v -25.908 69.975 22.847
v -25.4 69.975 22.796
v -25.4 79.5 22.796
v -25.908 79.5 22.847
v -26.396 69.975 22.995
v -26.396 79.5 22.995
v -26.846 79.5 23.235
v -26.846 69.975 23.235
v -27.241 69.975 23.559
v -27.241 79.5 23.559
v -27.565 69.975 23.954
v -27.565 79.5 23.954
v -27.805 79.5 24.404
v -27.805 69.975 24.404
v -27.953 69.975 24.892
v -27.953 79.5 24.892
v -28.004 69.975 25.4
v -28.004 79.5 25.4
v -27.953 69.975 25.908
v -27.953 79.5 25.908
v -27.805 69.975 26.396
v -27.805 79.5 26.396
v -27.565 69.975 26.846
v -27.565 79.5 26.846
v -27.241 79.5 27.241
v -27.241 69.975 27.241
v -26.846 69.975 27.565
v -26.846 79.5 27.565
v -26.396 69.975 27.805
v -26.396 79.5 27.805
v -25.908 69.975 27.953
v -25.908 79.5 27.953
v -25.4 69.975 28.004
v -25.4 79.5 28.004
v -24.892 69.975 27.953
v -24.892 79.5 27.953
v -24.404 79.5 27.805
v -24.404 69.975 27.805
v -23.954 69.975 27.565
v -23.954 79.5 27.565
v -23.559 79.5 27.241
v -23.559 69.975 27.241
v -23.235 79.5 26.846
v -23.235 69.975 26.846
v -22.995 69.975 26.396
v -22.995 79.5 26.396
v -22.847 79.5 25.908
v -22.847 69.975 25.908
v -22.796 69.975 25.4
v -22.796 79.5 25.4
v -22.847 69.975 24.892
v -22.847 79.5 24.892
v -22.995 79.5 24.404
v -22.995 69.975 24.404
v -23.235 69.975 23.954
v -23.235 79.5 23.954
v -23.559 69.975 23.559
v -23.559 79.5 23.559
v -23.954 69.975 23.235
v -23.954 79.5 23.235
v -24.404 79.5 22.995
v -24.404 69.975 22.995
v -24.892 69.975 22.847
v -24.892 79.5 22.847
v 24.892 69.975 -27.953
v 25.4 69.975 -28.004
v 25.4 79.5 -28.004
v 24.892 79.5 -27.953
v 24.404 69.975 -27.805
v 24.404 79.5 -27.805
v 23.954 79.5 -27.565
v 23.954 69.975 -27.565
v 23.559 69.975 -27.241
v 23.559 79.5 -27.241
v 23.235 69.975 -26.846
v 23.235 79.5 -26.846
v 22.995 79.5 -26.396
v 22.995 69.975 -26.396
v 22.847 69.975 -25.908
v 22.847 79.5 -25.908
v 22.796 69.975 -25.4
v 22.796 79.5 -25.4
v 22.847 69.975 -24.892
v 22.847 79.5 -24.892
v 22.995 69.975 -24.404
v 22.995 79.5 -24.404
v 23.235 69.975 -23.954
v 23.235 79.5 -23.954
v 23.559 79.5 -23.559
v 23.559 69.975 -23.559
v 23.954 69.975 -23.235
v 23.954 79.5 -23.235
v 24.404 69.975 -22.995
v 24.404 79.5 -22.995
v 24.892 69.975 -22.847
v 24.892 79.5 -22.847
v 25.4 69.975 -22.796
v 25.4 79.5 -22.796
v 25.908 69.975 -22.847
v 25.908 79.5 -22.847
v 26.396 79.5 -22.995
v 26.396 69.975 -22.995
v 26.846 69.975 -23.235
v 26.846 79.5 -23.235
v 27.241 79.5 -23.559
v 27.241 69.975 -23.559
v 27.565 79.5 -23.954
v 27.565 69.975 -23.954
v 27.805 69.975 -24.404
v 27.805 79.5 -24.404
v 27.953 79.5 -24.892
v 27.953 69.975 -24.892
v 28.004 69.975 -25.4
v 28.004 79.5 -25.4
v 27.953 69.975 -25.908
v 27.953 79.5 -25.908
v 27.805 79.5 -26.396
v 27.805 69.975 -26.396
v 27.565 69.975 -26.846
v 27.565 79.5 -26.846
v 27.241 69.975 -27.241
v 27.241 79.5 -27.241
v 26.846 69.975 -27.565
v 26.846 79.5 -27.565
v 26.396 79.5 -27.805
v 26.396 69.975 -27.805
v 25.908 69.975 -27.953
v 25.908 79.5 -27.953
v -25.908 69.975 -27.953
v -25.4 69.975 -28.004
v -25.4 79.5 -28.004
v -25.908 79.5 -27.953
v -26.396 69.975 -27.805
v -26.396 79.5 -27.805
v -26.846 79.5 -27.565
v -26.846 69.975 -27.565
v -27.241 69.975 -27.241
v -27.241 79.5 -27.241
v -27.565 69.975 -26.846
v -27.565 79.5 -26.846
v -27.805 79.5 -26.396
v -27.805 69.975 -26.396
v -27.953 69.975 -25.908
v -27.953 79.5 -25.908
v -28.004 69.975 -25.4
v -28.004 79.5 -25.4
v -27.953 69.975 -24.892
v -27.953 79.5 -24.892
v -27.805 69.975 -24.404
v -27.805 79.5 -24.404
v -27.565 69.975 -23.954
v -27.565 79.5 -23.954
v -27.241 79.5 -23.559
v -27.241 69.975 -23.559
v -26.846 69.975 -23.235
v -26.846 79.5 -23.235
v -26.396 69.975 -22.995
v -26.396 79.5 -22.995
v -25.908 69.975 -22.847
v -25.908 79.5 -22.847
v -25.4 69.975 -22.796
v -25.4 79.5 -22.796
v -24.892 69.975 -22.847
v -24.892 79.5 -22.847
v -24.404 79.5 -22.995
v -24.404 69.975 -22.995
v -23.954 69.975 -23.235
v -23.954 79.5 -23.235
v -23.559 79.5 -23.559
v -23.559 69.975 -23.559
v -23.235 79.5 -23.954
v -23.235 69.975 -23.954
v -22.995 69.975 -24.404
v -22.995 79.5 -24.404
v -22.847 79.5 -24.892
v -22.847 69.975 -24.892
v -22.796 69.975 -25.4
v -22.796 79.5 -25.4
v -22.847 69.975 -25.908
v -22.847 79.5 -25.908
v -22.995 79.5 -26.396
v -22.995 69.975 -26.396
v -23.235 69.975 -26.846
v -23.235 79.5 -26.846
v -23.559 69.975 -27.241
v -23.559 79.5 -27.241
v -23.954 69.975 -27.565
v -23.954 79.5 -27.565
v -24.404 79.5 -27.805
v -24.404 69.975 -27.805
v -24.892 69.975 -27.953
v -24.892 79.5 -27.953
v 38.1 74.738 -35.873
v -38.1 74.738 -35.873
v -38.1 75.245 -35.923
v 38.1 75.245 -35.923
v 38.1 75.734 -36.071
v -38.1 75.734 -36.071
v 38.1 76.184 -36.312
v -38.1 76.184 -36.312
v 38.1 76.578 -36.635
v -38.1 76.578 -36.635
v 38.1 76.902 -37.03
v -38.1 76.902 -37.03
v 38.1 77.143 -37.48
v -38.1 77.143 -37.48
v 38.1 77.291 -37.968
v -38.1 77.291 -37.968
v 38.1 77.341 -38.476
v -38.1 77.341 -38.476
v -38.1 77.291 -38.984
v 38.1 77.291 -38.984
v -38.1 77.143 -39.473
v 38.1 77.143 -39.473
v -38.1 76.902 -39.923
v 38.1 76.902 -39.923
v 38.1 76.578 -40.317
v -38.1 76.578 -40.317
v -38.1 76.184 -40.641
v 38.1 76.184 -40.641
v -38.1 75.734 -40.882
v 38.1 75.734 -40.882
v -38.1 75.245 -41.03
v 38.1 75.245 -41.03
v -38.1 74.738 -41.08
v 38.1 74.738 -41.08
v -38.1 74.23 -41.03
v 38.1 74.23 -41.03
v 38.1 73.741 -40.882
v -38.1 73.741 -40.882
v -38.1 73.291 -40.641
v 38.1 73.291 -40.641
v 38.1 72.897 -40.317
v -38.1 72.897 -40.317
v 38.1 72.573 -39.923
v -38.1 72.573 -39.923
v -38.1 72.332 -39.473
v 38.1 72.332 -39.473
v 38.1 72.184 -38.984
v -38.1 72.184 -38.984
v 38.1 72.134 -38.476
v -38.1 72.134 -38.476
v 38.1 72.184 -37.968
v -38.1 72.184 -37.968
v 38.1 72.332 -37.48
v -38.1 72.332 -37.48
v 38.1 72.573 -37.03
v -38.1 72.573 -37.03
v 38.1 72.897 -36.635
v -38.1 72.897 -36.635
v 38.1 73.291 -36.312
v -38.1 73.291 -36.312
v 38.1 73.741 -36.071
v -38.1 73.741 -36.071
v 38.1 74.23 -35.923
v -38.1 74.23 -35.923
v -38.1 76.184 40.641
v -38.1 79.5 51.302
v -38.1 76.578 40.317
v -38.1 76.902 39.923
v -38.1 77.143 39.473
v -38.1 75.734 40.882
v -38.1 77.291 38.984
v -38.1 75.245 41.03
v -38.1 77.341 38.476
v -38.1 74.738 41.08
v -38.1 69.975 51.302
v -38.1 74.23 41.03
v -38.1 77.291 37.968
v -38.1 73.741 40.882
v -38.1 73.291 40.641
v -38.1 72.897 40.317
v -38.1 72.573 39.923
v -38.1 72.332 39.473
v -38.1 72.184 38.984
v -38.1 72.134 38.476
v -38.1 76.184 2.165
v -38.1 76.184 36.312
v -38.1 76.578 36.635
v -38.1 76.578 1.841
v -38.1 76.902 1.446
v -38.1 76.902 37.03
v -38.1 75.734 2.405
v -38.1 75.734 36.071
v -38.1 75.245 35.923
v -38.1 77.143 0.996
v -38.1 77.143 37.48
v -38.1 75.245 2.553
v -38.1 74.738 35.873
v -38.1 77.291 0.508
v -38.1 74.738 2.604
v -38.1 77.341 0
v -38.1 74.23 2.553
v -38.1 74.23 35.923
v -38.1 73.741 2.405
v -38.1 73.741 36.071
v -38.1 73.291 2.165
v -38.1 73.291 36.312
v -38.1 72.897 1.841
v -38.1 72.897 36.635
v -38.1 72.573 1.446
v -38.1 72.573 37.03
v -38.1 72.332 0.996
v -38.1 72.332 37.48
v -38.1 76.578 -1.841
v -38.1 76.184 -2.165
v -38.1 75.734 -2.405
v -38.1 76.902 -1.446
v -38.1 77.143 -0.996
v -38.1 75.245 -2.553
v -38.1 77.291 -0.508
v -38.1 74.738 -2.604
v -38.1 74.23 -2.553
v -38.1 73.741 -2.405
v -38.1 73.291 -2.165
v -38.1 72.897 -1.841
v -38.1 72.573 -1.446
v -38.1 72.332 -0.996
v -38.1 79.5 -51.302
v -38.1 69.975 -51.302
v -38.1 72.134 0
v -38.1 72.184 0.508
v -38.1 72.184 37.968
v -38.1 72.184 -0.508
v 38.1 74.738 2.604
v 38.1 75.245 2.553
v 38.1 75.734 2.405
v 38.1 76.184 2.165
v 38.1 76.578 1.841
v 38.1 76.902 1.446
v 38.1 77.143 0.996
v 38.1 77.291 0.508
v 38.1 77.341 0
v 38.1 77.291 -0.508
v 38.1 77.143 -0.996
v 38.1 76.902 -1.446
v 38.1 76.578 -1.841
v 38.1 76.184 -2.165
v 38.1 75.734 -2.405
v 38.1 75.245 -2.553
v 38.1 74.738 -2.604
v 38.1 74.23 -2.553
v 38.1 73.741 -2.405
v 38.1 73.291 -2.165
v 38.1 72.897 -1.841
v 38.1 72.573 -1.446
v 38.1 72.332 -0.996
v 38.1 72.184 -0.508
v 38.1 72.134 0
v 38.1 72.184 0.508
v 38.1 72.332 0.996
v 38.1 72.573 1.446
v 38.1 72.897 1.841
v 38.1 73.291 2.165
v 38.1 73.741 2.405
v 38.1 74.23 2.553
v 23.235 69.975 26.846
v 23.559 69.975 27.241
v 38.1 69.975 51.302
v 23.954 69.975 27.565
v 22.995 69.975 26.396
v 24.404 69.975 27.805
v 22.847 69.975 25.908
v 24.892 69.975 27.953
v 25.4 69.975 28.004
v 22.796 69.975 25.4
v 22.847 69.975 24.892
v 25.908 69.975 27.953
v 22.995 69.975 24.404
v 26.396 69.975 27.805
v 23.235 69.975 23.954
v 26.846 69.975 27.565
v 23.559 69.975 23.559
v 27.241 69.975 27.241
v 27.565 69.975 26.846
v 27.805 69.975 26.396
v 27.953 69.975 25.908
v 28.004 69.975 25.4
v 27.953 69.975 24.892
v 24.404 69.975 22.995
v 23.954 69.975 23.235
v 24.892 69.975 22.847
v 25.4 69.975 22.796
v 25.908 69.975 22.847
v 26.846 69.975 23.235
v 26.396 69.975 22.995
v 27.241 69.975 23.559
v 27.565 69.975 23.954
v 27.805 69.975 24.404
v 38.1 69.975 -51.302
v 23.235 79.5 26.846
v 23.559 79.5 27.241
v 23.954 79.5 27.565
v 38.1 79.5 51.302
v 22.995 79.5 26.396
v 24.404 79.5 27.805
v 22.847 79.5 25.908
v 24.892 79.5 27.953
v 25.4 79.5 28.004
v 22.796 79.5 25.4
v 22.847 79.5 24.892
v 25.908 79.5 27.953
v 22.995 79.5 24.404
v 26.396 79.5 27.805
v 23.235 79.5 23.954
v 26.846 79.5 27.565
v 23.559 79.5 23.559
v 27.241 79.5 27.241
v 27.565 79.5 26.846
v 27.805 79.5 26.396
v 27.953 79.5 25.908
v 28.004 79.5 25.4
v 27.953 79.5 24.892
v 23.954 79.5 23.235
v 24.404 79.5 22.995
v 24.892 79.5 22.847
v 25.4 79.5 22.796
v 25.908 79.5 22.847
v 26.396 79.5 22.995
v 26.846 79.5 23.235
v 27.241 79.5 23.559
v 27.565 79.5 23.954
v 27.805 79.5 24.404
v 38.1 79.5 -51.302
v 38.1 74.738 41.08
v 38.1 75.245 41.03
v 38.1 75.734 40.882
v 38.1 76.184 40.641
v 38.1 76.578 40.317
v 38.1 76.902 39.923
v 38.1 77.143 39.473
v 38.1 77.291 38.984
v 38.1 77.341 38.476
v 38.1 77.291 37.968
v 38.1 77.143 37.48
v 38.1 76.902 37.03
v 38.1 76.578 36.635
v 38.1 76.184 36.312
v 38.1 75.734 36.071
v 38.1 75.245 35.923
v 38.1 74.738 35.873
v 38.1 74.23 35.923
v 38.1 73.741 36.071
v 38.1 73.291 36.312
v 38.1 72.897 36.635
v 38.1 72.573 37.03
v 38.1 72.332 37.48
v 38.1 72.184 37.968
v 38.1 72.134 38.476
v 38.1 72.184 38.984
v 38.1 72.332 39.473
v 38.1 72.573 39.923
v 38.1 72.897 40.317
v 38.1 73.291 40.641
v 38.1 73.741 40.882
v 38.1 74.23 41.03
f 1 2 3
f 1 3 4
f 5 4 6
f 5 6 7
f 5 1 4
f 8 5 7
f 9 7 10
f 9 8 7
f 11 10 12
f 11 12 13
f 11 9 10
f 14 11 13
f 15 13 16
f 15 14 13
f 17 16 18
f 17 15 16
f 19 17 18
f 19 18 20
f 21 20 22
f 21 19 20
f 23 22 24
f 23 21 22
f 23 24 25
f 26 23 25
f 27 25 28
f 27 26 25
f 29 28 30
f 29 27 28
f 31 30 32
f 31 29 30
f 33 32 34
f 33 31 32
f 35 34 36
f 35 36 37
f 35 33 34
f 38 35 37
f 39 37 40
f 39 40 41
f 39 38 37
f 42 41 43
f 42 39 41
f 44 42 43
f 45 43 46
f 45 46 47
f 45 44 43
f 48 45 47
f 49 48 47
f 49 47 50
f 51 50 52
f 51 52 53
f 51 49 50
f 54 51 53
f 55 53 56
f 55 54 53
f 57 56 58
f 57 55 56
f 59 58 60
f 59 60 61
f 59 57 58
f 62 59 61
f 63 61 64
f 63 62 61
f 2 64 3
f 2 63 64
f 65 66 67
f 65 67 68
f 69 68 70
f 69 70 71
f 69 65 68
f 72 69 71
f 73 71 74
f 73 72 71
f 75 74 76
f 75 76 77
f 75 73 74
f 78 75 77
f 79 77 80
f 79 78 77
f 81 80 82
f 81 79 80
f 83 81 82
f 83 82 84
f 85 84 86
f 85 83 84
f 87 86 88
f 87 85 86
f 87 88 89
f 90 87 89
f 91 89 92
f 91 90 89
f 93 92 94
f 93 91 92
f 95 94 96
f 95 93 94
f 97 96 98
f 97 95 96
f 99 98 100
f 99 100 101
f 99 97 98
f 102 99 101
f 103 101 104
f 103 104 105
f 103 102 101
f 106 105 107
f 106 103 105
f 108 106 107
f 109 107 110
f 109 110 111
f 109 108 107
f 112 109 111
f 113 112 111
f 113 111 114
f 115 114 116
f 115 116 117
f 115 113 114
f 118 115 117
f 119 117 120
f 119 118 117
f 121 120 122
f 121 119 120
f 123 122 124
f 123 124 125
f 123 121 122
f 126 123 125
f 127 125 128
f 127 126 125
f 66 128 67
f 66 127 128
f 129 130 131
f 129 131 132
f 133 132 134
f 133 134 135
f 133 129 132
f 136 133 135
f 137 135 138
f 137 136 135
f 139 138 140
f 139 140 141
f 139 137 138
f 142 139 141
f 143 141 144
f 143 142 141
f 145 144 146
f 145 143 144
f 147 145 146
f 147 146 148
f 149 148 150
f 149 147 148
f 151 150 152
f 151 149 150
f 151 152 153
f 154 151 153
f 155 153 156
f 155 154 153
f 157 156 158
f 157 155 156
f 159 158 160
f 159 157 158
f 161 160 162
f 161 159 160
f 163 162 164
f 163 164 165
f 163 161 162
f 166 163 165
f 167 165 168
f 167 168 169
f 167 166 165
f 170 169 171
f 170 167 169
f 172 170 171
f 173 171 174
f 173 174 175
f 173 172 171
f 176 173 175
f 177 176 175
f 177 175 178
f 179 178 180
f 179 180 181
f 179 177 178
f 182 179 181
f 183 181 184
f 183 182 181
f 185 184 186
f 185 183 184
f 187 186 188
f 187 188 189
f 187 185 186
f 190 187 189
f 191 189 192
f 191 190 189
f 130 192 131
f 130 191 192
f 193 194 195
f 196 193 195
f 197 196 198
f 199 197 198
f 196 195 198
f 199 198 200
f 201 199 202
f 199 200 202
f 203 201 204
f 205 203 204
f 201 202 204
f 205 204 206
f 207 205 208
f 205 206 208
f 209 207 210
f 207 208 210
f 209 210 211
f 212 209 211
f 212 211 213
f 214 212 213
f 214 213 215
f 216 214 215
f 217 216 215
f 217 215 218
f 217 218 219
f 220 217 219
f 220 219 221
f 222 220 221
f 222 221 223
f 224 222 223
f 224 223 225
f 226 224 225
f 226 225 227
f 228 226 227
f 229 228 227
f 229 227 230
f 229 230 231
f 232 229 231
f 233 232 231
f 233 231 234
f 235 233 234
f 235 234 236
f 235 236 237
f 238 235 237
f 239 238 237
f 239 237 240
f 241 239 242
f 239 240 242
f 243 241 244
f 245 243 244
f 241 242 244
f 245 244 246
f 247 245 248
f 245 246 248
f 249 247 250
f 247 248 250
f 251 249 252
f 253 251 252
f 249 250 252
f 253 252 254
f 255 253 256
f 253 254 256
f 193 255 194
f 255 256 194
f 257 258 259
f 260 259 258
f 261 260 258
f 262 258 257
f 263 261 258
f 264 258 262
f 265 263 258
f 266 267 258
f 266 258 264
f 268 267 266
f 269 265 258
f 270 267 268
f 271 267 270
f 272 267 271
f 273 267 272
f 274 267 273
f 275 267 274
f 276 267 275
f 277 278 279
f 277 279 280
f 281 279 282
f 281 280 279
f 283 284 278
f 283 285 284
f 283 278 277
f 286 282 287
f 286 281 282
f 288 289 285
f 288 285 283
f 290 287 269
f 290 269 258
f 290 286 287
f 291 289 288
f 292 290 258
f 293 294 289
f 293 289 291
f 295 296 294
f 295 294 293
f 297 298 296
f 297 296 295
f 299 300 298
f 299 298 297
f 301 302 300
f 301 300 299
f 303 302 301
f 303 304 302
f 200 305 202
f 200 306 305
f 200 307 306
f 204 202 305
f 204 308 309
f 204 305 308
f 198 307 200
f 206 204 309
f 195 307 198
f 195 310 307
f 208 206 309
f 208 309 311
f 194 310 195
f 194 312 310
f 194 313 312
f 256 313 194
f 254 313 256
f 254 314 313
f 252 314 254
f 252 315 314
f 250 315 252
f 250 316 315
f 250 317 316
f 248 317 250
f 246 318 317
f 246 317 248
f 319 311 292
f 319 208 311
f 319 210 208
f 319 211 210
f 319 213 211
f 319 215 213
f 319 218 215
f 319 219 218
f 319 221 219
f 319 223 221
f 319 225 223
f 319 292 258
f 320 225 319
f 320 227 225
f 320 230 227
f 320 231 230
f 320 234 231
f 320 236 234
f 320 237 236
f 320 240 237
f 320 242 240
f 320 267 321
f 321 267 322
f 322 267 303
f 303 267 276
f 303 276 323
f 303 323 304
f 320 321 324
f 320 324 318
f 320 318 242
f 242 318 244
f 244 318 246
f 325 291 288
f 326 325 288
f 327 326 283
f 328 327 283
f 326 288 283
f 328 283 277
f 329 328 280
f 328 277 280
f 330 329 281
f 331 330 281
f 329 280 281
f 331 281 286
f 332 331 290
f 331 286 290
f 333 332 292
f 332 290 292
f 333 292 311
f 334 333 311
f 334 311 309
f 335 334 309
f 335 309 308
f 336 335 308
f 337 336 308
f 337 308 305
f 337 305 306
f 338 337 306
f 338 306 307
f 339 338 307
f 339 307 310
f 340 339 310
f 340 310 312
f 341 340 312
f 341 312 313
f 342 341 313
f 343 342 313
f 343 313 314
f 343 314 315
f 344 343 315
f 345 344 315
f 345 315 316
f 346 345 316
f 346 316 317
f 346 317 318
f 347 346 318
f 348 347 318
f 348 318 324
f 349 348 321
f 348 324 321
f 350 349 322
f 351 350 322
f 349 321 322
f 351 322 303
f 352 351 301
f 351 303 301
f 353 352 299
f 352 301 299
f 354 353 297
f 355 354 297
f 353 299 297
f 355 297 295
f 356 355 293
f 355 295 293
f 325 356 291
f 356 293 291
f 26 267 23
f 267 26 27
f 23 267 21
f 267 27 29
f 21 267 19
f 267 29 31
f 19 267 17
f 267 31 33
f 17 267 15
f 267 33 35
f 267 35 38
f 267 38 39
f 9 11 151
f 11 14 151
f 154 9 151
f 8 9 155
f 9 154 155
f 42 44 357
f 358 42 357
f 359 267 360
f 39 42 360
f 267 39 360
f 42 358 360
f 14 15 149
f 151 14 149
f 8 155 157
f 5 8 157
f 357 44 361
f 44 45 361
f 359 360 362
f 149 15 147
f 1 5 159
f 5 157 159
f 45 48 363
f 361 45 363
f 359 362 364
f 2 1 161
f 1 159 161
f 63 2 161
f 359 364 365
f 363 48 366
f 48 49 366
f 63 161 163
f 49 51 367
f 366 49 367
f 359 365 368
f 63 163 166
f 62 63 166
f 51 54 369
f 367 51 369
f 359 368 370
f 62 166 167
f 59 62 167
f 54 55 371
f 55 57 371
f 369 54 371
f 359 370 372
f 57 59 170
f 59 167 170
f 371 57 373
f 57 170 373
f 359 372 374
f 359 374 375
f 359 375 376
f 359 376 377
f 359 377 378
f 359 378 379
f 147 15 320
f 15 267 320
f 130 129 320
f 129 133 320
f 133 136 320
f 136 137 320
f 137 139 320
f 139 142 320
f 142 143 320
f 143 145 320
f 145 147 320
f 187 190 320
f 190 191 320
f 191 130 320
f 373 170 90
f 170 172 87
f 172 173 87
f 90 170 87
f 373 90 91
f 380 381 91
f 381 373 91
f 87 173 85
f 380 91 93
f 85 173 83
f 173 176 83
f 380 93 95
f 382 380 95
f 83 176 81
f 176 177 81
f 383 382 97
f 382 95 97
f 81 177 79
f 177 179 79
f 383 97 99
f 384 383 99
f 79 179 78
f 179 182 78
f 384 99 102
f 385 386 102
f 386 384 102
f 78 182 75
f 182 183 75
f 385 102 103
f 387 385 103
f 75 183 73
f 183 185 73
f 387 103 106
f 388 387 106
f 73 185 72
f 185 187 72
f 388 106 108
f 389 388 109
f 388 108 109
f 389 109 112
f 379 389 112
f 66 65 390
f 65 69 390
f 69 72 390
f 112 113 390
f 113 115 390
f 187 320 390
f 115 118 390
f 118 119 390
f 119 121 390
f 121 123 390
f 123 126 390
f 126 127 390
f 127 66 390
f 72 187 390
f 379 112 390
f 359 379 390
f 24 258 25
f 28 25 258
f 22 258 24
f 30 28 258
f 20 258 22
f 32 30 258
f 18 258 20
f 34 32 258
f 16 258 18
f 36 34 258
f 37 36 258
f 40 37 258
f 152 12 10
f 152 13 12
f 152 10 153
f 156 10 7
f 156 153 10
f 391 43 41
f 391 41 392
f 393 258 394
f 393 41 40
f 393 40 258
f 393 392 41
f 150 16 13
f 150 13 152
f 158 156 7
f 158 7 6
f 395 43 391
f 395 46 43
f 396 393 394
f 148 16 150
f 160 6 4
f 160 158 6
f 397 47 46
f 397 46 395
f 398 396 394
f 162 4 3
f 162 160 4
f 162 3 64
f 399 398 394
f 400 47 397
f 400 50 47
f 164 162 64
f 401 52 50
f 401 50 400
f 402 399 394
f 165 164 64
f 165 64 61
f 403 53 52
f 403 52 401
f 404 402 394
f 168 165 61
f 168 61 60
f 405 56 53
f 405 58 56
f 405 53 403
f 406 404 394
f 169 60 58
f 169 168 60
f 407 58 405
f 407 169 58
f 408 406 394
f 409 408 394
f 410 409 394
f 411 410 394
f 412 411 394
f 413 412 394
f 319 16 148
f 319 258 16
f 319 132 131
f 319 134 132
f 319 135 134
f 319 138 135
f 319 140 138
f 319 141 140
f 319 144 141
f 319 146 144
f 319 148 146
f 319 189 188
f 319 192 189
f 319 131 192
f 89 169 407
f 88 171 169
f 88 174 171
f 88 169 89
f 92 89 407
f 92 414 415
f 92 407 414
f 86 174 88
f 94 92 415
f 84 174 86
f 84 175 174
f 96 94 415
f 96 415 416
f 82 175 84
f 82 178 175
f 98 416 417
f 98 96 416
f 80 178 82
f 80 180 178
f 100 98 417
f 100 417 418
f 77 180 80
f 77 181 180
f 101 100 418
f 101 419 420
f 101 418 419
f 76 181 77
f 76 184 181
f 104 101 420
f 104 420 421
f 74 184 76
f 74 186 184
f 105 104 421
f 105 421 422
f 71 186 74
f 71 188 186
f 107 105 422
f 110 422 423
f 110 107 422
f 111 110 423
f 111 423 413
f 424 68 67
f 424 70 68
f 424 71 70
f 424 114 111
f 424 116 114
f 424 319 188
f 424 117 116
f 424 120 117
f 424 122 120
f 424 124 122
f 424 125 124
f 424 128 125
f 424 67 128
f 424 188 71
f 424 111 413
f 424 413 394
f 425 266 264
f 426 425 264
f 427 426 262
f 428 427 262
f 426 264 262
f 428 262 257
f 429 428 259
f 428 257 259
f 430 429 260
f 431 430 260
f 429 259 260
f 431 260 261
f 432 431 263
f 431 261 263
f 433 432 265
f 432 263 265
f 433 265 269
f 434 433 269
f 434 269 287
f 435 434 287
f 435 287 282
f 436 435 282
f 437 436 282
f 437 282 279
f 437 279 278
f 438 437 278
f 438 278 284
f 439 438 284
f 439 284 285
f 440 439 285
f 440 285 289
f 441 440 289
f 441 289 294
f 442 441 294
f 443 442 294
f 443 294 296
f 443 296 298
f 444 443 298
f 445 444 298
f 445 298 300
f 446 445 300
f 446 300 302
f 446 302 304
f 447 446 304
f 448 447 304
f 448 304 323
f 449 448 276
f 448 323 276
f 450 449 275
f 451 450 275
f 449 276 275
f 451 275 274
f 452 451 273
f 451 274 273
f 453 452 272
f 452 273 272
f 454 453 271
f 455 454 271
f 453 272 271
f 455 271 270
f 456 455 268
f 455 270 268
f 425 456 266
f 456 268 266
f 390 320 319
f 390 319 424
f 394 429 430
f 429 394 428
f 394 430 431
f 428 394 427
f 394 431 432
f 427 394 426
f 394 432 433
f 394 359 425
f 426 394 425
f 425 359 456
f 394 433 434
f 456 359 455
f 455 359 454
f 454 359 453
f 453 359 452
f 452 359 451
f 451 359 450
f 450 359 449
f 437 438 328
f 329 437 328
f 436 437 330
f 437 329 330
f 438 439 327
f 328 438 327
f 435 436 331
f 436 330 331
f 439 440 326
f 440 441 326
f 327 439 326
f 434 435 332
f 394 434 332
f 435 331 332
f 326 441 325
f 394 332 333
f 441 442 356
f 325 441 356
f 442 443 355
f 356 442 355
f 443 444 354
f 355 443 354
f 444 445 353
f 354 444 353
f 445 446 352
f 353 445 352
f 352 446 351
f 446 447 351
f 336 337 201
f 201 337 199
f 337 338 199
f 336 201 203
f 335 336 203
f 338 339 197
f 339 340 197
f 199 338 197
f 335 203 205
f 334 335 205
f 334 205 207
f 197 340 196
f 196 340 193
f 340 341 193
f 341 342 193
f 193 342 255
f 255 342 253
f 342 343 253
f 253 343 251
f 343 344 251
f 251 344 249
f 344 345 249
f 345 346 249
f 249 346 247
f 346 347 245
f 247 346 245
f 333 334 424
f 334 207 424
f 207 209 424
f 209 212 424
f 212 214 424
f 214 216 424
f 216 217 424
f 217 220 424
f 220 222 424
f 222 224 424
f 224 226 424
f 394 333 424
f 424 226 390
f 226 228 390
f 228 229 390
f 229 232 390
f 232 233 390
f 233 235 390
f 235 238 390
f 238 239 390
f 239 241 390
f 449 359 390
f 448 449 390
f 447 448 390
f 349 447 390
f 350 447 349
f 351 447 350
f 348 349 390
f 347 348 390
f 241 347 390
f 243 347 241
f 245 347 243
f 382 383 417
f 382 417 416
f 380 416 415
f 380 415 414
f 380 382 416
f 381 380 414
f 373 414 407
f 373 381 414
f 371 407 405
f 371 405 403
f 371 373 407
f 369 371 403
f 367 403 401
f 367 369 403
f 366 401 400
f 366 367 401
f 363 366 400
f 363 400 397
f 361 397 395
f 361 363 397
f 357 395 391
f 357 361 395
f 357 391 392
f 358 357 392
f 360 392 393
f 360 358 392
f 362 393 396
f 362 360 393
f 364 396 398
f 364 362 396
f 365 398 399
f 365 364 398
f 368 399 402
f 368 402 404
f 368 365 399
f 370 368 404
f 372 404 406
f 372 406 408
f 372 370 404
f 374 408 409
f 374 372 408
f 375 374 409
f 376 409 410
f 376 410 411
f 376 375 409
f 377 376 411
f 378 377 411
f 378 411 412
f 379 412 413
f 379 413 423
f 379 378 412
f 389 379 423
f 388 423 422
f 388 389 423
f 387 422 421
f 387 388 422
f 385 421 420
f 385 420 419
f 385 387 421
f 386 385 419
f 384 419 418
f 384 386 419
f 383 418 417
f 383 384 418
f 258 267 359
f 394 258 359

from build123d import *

# Parameters (mm, degrees)
SKETCH1_W           = 76.2
SKETCH1_H           = 102.603301604
SKETCH1_R           = 2.6035
BOSS_EXTRUDE1_DEPTH = 9.525
SKETCH2_R           = 2.6035
CUT_EXTRUDE1_DEPTH  = 122.484770136


with BuildPart() as part:
    # Sketch1 → Boss-Extrude1 (new body)
    with BuildSketch(Plane(origin=(0, 69.975, 0), x_dir=(1, 0, 0), z_dir=(0, 1, 0))):
        Rectangle(SKETCH1_W, SKETCH1_H)
        with Locations(Location((25.4, -25.4, 0), (0, 0, 90))):
            Circle(SKETCH1_R, mode=Mode.SUBTRACT)
        with Locations(Location((-25.4, -25.4, 0), (0, 0, 90))):
            Circle(SKETCH1_R, mode=Mode.SUBTRACT)
        with Locations(Location((-25.4, 25.4, 0), (0, 0, 90))):
            Circle(SKETCH1_R, mode=Mode.SUBTRACT)
        with Locations(Location((25.4, 25.4, 0), (0, 0, 90))):
            Circle(SKETCH1_R, mode=Mode.SUBTRACT)
    extrude(amount=BOSS_EXTRUDE1_DEPTH)

    # Sketch2 → Cut-Extrude1 (cut, through all)
    with BuildSketch(Plane.ZY.offset(38.1)):
        with Locations((0, 74.7375)):
            Circle(SKETCH2_R)
        with Locations((-38.476238101, 74.7375)):
            Circle(SKETCH2_R)
        with Locations((38.476238101, 74.7375)):
            Circle(SKETCH2_R)
    extrude(amount=-CUT_EXTRUDE1_DEPTH, mode=Mode.SUBTRACT)


solid = part.part
